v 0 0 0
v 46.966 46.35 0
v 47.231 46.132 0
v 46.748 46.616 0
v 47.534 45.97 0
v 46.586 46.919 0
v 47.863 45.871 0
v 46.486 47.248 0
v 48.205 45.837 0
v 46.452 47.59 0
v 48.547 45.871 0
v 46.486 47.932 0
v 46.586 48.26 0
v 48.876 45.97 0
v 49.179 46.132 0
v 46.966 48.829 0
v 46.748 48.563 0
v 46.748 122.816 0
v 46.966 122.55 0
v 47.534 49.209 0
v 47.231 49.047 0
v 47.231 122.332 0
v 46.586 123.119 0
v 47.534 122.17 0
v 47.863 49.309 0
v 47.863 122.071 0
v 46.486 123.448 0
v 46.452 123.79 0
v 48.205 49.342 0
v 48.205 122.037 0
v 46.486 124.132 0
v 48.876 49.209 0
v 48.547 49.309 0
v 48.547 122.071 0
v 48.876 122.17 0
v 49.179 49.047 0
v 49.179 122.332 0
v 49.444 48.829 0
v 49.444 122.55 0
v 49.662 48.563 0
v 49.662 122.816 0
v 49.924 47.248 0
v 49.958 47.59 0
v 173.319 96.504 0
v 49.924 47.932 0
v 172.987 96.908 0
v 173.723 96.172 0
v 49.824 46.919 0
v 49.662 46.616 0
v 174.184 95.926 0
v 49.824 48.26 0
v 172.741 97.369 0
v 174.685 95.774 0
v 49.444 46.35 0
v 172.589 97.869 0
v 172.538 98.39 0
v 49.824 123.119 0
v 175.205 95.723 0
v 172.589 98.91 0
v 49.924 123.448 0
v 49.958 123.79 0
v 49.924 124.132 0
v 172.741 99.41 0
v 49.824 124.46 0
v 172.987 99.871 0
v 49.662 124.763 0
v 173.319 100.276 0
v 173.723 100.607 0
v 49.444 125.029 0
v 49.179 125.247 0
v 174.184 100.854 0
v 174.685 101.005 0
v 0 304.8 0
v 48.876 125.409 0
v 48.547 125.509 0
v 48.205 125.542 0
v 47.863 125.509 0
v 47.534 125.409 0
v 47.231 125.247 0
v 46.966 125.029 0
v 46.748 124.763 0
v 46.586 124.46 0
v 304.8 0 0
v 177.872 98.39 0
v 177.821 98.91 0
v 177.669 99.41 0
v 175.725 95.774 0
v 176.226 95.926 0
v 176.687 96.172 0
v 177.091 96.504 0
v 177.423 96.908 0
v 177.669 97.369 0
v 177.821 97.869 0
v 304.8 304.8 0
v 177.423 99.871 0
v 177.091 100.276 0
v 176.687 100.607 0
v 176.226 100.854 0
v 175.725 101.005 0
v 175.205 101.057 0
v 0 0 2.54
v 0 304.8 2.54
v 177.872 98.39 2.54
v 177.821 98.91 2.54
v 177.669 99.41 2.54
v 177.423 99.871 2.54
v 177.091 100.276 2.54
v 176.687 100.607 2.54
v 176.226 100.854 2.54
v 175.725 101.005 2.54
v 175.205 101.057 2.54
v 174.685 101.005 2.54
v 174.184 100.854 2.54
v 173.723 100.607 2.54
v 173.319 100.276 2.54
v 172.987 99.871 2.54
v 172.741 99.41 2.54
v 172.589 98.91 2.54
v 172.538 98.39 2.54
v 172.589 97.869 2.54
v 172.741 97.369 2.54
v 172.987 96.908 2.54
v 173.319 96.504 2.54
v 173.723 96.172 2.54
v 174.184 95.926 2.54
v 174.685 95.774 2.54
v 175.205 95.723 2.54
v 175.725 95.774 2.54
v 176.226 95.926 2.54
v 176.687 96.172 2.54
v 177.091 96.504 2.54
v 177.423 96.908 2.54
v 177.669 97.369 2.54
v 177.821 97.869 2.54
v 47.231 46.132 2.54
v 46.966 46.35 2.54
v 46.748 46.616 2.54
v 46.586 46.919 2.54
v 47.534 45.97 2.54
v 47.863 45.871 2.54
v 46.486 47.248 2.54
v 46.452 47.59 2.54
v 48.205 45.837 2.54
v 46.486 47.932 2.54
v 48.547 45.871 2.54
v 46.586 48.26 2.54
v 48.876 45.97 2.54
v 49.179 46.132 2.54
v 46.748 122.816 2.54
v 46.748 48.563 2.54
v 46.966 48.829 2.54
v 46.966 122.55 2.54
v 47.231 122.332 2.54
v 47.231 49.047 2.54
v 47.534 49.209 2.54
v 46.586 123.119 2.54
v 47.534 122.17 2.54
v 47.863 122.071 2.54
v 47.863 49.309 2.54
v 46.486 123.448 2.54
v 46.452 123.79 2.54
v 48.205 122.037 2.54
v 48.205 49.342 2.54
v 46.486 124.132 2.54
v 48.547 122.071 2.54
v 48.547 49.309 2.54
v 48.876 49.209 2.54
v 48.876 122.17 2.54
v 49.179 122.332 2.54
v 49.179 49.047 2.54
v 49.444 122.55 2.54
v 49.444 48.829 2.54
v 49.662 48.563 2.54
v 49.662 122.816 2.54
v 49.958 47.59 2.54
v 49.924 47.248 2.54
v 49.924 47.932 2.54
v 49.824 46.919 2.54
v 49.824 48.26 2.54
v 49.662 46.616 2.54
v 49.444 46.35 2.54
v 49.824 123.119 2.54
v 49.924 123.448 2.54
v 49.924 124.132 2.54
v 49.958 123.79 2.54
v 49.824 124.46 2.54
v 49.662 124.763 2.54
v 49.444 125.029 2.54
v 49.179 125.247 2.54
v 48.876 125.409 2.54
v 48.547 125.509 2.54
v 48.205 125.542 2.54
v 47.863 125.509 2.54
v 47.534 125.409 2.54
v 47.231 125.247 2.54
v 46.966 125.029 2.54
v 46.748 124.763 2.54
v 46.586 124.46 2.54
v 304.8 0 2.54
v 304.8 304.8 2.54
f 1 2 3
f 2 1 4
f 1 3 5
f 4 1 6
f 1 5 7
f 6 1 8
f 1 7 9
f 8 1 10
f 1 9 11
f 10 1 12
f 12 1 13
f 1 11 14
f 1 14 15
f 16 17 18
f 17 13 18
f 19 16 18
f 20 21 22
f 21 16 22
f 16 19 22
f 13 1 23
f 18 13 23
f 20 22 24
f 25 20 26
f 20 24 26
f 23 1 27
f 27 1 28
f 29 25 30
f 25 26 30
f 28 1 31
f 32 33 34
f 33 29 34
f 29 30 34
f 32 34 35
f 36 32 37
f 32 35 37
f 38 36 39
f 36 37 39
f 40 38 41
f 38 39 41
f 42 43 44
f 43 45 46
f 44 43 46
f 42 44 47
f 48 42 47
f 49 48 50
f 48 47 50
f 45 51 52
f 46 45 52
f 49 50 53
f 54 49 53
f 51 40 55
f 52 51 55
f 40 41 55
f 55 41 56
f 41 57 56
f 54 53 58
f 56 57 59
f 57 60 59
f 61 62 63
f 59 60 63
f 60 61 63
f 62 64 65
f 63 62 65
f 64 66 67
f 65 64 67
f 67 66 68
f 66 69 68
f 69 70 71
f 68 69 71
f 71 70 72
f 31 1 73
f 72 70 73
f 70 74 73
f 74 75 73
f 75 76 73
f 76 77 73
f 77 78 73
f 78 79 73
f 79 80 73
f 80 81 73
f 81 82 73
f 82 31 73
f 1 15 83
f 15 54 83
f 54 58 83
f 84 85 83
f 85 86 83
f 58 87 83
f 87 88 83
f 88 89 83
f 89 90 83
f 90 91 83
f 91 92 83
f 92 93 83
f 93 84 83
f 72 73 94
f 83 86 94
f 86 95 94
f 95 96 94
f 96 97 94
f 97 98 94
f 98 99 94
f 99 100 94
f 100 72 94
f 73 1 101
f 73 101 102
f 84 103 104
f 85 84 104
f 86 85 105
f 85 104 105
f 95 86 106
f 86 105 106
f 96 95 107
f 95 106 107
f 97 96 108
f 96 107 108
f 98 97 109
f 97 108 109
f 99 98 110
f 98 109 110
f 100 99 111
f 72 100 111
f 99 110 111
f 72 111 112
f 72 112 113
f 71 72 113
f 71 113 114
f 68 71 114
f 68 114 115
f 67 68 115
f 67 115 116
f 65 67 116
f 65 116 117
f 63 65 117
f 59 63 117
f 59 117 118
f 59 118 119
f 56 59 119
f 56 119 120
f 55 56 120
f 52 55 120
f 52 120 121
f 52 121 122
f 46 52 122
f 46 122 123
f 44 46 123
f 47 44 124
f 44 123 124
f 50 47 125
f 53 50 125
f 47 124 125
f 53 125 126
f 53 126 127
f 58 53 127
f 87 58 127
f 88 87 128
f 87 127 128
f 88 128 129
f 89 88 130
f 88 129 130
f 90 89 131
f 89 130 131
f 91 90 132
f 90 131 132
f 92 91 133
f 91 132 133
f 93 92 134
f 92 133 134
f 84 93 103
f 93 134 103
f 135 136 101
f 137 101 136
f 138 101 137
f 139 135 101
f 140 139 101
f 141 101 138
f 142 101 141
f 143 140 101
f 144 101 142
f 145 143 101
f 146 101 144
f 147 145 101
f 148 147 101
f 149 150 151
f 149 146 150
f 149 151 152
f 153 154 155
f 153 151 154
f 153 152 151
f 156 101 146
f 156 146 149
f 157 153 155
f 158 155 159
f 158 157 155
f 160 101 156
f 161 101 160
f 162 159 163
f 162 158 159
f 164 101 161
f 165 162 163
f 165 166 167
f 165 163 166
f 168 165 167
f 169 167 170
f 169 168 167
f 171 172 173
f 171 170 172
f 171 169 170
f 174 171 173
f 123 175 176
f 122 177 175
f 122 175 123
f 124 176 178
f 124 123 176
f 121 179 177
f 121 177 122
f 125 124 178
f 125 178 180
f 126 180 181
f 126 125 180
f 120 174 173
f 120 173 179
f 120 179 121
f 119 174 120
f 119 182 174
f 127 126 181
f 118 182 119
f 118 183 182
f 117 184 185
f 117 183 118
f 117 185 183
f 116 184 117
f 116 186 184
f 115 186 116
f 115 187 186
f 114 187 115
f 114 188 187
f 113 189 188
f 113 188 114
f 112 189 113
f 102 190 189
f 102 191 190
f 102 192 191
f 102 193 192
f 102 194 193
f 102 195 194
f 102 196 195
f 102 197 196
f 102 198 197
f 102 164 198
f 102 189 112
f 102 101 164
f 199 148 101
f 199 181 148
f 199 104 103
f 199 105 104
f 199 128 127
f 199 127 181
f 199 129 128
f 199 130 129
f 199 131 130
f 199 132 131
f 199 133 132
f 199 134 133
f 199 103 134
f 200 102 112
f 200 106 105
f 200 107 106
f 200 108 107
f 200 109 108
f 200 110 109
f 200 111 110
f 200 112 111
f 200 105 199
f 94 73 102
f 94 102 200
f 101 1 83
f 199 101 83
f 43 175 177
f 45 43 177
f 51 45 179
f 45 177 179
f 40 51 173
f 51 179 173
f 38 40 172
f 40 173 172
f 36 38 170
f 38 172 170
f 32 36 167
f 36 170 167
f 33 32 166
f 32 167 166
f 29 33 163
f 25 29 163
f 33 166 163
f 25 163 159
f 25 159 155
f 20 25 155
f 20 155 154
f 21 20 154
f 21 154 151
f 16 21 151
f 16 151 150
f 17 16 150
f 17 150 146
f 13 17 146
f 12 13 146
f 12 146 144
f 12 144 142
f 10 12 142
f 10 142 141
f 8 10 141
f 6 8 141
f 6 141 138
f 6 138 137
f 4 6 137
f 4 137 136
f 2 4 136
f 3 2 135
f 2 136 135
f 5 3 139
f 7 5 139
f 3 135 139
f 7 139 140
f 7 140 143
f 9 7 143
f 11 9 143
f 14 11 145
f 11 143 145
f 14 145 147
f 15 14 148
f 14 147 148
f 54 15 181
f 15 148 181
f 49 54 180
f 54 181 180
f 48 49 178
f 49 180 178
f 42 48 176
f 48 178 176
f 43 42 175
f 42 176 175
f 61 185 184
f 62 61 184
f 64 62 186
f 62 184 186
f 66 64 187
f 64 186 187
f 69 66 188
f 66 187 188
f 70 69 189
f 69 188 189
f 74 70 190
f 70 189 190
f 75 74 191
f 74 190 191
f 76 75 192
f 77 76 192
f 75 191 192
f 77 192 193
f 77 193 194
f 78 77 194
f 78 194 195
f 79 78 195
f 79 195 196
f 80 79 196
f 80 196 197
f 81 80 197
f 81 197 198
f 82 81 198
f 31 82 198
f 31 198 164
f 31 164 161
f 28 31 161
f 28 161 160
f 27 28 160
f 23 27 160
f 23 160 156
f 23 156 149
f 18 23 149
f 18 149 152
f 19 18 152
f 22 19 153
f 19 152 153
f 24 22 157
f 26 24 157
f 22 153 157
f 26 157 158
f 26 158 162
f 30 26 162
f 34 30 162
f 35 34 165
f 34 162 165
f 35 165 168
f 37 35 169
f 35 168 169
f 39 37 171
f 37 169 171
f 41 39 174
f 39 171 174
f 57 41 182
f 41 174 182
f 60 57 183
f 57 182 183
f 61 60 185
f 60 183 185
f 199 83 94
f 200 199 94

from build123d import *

# Parameters (mm, degrees)
SKETCH1_W               = 304.8
SKETCH1_H               = 304.8
BOSS_EXTRUDE1_DEPTH     = 2.54
SKETCH2_R               = 1.7526
SKETCH2_R_2             = 2.667
CUT_EXTRUDE1_DEPTH      = 1
CUT_EXTRUDE1_DEPTH_BACK = 3.54


with BuildPart() as part:
    # Sketch1 → Boss-Extrude1 (new body)
    with BuildSketch(Plane.XY):
        with Locations((152.4, 152.4)):
            Rectangle(SKETCH1_W, SKETCH1_H)
    extrude(amount=BOSS_EXTRUDE1_DEPTH)

    # Sketch2 → Cut-Extrude1 (cut, two sides)
    with BuildSketch(Plane.XY.offset(2.54)) as cut_extrude1_sk:
        with Locations((48.204991745, 47.589666893)):
            Circle(SKETCH2_R)
        with Locations((175.204991745, 98.389666893)):
            Circle(SKETCH2_R_2)
        with Locations((48.204991745, 123.789666893)):
            Circle(SKETCH2_R)
    extrude(amount=CUT_EXTRUDE1_DEPTH, mode=Mode.SUBTRACT)
    extrude(cut_extrude1_sk.sketch, amount=-CUT_EXTRUDE1_DEPTH_BACK, mode=Mode.SUBTRACT)


solid = part.part
